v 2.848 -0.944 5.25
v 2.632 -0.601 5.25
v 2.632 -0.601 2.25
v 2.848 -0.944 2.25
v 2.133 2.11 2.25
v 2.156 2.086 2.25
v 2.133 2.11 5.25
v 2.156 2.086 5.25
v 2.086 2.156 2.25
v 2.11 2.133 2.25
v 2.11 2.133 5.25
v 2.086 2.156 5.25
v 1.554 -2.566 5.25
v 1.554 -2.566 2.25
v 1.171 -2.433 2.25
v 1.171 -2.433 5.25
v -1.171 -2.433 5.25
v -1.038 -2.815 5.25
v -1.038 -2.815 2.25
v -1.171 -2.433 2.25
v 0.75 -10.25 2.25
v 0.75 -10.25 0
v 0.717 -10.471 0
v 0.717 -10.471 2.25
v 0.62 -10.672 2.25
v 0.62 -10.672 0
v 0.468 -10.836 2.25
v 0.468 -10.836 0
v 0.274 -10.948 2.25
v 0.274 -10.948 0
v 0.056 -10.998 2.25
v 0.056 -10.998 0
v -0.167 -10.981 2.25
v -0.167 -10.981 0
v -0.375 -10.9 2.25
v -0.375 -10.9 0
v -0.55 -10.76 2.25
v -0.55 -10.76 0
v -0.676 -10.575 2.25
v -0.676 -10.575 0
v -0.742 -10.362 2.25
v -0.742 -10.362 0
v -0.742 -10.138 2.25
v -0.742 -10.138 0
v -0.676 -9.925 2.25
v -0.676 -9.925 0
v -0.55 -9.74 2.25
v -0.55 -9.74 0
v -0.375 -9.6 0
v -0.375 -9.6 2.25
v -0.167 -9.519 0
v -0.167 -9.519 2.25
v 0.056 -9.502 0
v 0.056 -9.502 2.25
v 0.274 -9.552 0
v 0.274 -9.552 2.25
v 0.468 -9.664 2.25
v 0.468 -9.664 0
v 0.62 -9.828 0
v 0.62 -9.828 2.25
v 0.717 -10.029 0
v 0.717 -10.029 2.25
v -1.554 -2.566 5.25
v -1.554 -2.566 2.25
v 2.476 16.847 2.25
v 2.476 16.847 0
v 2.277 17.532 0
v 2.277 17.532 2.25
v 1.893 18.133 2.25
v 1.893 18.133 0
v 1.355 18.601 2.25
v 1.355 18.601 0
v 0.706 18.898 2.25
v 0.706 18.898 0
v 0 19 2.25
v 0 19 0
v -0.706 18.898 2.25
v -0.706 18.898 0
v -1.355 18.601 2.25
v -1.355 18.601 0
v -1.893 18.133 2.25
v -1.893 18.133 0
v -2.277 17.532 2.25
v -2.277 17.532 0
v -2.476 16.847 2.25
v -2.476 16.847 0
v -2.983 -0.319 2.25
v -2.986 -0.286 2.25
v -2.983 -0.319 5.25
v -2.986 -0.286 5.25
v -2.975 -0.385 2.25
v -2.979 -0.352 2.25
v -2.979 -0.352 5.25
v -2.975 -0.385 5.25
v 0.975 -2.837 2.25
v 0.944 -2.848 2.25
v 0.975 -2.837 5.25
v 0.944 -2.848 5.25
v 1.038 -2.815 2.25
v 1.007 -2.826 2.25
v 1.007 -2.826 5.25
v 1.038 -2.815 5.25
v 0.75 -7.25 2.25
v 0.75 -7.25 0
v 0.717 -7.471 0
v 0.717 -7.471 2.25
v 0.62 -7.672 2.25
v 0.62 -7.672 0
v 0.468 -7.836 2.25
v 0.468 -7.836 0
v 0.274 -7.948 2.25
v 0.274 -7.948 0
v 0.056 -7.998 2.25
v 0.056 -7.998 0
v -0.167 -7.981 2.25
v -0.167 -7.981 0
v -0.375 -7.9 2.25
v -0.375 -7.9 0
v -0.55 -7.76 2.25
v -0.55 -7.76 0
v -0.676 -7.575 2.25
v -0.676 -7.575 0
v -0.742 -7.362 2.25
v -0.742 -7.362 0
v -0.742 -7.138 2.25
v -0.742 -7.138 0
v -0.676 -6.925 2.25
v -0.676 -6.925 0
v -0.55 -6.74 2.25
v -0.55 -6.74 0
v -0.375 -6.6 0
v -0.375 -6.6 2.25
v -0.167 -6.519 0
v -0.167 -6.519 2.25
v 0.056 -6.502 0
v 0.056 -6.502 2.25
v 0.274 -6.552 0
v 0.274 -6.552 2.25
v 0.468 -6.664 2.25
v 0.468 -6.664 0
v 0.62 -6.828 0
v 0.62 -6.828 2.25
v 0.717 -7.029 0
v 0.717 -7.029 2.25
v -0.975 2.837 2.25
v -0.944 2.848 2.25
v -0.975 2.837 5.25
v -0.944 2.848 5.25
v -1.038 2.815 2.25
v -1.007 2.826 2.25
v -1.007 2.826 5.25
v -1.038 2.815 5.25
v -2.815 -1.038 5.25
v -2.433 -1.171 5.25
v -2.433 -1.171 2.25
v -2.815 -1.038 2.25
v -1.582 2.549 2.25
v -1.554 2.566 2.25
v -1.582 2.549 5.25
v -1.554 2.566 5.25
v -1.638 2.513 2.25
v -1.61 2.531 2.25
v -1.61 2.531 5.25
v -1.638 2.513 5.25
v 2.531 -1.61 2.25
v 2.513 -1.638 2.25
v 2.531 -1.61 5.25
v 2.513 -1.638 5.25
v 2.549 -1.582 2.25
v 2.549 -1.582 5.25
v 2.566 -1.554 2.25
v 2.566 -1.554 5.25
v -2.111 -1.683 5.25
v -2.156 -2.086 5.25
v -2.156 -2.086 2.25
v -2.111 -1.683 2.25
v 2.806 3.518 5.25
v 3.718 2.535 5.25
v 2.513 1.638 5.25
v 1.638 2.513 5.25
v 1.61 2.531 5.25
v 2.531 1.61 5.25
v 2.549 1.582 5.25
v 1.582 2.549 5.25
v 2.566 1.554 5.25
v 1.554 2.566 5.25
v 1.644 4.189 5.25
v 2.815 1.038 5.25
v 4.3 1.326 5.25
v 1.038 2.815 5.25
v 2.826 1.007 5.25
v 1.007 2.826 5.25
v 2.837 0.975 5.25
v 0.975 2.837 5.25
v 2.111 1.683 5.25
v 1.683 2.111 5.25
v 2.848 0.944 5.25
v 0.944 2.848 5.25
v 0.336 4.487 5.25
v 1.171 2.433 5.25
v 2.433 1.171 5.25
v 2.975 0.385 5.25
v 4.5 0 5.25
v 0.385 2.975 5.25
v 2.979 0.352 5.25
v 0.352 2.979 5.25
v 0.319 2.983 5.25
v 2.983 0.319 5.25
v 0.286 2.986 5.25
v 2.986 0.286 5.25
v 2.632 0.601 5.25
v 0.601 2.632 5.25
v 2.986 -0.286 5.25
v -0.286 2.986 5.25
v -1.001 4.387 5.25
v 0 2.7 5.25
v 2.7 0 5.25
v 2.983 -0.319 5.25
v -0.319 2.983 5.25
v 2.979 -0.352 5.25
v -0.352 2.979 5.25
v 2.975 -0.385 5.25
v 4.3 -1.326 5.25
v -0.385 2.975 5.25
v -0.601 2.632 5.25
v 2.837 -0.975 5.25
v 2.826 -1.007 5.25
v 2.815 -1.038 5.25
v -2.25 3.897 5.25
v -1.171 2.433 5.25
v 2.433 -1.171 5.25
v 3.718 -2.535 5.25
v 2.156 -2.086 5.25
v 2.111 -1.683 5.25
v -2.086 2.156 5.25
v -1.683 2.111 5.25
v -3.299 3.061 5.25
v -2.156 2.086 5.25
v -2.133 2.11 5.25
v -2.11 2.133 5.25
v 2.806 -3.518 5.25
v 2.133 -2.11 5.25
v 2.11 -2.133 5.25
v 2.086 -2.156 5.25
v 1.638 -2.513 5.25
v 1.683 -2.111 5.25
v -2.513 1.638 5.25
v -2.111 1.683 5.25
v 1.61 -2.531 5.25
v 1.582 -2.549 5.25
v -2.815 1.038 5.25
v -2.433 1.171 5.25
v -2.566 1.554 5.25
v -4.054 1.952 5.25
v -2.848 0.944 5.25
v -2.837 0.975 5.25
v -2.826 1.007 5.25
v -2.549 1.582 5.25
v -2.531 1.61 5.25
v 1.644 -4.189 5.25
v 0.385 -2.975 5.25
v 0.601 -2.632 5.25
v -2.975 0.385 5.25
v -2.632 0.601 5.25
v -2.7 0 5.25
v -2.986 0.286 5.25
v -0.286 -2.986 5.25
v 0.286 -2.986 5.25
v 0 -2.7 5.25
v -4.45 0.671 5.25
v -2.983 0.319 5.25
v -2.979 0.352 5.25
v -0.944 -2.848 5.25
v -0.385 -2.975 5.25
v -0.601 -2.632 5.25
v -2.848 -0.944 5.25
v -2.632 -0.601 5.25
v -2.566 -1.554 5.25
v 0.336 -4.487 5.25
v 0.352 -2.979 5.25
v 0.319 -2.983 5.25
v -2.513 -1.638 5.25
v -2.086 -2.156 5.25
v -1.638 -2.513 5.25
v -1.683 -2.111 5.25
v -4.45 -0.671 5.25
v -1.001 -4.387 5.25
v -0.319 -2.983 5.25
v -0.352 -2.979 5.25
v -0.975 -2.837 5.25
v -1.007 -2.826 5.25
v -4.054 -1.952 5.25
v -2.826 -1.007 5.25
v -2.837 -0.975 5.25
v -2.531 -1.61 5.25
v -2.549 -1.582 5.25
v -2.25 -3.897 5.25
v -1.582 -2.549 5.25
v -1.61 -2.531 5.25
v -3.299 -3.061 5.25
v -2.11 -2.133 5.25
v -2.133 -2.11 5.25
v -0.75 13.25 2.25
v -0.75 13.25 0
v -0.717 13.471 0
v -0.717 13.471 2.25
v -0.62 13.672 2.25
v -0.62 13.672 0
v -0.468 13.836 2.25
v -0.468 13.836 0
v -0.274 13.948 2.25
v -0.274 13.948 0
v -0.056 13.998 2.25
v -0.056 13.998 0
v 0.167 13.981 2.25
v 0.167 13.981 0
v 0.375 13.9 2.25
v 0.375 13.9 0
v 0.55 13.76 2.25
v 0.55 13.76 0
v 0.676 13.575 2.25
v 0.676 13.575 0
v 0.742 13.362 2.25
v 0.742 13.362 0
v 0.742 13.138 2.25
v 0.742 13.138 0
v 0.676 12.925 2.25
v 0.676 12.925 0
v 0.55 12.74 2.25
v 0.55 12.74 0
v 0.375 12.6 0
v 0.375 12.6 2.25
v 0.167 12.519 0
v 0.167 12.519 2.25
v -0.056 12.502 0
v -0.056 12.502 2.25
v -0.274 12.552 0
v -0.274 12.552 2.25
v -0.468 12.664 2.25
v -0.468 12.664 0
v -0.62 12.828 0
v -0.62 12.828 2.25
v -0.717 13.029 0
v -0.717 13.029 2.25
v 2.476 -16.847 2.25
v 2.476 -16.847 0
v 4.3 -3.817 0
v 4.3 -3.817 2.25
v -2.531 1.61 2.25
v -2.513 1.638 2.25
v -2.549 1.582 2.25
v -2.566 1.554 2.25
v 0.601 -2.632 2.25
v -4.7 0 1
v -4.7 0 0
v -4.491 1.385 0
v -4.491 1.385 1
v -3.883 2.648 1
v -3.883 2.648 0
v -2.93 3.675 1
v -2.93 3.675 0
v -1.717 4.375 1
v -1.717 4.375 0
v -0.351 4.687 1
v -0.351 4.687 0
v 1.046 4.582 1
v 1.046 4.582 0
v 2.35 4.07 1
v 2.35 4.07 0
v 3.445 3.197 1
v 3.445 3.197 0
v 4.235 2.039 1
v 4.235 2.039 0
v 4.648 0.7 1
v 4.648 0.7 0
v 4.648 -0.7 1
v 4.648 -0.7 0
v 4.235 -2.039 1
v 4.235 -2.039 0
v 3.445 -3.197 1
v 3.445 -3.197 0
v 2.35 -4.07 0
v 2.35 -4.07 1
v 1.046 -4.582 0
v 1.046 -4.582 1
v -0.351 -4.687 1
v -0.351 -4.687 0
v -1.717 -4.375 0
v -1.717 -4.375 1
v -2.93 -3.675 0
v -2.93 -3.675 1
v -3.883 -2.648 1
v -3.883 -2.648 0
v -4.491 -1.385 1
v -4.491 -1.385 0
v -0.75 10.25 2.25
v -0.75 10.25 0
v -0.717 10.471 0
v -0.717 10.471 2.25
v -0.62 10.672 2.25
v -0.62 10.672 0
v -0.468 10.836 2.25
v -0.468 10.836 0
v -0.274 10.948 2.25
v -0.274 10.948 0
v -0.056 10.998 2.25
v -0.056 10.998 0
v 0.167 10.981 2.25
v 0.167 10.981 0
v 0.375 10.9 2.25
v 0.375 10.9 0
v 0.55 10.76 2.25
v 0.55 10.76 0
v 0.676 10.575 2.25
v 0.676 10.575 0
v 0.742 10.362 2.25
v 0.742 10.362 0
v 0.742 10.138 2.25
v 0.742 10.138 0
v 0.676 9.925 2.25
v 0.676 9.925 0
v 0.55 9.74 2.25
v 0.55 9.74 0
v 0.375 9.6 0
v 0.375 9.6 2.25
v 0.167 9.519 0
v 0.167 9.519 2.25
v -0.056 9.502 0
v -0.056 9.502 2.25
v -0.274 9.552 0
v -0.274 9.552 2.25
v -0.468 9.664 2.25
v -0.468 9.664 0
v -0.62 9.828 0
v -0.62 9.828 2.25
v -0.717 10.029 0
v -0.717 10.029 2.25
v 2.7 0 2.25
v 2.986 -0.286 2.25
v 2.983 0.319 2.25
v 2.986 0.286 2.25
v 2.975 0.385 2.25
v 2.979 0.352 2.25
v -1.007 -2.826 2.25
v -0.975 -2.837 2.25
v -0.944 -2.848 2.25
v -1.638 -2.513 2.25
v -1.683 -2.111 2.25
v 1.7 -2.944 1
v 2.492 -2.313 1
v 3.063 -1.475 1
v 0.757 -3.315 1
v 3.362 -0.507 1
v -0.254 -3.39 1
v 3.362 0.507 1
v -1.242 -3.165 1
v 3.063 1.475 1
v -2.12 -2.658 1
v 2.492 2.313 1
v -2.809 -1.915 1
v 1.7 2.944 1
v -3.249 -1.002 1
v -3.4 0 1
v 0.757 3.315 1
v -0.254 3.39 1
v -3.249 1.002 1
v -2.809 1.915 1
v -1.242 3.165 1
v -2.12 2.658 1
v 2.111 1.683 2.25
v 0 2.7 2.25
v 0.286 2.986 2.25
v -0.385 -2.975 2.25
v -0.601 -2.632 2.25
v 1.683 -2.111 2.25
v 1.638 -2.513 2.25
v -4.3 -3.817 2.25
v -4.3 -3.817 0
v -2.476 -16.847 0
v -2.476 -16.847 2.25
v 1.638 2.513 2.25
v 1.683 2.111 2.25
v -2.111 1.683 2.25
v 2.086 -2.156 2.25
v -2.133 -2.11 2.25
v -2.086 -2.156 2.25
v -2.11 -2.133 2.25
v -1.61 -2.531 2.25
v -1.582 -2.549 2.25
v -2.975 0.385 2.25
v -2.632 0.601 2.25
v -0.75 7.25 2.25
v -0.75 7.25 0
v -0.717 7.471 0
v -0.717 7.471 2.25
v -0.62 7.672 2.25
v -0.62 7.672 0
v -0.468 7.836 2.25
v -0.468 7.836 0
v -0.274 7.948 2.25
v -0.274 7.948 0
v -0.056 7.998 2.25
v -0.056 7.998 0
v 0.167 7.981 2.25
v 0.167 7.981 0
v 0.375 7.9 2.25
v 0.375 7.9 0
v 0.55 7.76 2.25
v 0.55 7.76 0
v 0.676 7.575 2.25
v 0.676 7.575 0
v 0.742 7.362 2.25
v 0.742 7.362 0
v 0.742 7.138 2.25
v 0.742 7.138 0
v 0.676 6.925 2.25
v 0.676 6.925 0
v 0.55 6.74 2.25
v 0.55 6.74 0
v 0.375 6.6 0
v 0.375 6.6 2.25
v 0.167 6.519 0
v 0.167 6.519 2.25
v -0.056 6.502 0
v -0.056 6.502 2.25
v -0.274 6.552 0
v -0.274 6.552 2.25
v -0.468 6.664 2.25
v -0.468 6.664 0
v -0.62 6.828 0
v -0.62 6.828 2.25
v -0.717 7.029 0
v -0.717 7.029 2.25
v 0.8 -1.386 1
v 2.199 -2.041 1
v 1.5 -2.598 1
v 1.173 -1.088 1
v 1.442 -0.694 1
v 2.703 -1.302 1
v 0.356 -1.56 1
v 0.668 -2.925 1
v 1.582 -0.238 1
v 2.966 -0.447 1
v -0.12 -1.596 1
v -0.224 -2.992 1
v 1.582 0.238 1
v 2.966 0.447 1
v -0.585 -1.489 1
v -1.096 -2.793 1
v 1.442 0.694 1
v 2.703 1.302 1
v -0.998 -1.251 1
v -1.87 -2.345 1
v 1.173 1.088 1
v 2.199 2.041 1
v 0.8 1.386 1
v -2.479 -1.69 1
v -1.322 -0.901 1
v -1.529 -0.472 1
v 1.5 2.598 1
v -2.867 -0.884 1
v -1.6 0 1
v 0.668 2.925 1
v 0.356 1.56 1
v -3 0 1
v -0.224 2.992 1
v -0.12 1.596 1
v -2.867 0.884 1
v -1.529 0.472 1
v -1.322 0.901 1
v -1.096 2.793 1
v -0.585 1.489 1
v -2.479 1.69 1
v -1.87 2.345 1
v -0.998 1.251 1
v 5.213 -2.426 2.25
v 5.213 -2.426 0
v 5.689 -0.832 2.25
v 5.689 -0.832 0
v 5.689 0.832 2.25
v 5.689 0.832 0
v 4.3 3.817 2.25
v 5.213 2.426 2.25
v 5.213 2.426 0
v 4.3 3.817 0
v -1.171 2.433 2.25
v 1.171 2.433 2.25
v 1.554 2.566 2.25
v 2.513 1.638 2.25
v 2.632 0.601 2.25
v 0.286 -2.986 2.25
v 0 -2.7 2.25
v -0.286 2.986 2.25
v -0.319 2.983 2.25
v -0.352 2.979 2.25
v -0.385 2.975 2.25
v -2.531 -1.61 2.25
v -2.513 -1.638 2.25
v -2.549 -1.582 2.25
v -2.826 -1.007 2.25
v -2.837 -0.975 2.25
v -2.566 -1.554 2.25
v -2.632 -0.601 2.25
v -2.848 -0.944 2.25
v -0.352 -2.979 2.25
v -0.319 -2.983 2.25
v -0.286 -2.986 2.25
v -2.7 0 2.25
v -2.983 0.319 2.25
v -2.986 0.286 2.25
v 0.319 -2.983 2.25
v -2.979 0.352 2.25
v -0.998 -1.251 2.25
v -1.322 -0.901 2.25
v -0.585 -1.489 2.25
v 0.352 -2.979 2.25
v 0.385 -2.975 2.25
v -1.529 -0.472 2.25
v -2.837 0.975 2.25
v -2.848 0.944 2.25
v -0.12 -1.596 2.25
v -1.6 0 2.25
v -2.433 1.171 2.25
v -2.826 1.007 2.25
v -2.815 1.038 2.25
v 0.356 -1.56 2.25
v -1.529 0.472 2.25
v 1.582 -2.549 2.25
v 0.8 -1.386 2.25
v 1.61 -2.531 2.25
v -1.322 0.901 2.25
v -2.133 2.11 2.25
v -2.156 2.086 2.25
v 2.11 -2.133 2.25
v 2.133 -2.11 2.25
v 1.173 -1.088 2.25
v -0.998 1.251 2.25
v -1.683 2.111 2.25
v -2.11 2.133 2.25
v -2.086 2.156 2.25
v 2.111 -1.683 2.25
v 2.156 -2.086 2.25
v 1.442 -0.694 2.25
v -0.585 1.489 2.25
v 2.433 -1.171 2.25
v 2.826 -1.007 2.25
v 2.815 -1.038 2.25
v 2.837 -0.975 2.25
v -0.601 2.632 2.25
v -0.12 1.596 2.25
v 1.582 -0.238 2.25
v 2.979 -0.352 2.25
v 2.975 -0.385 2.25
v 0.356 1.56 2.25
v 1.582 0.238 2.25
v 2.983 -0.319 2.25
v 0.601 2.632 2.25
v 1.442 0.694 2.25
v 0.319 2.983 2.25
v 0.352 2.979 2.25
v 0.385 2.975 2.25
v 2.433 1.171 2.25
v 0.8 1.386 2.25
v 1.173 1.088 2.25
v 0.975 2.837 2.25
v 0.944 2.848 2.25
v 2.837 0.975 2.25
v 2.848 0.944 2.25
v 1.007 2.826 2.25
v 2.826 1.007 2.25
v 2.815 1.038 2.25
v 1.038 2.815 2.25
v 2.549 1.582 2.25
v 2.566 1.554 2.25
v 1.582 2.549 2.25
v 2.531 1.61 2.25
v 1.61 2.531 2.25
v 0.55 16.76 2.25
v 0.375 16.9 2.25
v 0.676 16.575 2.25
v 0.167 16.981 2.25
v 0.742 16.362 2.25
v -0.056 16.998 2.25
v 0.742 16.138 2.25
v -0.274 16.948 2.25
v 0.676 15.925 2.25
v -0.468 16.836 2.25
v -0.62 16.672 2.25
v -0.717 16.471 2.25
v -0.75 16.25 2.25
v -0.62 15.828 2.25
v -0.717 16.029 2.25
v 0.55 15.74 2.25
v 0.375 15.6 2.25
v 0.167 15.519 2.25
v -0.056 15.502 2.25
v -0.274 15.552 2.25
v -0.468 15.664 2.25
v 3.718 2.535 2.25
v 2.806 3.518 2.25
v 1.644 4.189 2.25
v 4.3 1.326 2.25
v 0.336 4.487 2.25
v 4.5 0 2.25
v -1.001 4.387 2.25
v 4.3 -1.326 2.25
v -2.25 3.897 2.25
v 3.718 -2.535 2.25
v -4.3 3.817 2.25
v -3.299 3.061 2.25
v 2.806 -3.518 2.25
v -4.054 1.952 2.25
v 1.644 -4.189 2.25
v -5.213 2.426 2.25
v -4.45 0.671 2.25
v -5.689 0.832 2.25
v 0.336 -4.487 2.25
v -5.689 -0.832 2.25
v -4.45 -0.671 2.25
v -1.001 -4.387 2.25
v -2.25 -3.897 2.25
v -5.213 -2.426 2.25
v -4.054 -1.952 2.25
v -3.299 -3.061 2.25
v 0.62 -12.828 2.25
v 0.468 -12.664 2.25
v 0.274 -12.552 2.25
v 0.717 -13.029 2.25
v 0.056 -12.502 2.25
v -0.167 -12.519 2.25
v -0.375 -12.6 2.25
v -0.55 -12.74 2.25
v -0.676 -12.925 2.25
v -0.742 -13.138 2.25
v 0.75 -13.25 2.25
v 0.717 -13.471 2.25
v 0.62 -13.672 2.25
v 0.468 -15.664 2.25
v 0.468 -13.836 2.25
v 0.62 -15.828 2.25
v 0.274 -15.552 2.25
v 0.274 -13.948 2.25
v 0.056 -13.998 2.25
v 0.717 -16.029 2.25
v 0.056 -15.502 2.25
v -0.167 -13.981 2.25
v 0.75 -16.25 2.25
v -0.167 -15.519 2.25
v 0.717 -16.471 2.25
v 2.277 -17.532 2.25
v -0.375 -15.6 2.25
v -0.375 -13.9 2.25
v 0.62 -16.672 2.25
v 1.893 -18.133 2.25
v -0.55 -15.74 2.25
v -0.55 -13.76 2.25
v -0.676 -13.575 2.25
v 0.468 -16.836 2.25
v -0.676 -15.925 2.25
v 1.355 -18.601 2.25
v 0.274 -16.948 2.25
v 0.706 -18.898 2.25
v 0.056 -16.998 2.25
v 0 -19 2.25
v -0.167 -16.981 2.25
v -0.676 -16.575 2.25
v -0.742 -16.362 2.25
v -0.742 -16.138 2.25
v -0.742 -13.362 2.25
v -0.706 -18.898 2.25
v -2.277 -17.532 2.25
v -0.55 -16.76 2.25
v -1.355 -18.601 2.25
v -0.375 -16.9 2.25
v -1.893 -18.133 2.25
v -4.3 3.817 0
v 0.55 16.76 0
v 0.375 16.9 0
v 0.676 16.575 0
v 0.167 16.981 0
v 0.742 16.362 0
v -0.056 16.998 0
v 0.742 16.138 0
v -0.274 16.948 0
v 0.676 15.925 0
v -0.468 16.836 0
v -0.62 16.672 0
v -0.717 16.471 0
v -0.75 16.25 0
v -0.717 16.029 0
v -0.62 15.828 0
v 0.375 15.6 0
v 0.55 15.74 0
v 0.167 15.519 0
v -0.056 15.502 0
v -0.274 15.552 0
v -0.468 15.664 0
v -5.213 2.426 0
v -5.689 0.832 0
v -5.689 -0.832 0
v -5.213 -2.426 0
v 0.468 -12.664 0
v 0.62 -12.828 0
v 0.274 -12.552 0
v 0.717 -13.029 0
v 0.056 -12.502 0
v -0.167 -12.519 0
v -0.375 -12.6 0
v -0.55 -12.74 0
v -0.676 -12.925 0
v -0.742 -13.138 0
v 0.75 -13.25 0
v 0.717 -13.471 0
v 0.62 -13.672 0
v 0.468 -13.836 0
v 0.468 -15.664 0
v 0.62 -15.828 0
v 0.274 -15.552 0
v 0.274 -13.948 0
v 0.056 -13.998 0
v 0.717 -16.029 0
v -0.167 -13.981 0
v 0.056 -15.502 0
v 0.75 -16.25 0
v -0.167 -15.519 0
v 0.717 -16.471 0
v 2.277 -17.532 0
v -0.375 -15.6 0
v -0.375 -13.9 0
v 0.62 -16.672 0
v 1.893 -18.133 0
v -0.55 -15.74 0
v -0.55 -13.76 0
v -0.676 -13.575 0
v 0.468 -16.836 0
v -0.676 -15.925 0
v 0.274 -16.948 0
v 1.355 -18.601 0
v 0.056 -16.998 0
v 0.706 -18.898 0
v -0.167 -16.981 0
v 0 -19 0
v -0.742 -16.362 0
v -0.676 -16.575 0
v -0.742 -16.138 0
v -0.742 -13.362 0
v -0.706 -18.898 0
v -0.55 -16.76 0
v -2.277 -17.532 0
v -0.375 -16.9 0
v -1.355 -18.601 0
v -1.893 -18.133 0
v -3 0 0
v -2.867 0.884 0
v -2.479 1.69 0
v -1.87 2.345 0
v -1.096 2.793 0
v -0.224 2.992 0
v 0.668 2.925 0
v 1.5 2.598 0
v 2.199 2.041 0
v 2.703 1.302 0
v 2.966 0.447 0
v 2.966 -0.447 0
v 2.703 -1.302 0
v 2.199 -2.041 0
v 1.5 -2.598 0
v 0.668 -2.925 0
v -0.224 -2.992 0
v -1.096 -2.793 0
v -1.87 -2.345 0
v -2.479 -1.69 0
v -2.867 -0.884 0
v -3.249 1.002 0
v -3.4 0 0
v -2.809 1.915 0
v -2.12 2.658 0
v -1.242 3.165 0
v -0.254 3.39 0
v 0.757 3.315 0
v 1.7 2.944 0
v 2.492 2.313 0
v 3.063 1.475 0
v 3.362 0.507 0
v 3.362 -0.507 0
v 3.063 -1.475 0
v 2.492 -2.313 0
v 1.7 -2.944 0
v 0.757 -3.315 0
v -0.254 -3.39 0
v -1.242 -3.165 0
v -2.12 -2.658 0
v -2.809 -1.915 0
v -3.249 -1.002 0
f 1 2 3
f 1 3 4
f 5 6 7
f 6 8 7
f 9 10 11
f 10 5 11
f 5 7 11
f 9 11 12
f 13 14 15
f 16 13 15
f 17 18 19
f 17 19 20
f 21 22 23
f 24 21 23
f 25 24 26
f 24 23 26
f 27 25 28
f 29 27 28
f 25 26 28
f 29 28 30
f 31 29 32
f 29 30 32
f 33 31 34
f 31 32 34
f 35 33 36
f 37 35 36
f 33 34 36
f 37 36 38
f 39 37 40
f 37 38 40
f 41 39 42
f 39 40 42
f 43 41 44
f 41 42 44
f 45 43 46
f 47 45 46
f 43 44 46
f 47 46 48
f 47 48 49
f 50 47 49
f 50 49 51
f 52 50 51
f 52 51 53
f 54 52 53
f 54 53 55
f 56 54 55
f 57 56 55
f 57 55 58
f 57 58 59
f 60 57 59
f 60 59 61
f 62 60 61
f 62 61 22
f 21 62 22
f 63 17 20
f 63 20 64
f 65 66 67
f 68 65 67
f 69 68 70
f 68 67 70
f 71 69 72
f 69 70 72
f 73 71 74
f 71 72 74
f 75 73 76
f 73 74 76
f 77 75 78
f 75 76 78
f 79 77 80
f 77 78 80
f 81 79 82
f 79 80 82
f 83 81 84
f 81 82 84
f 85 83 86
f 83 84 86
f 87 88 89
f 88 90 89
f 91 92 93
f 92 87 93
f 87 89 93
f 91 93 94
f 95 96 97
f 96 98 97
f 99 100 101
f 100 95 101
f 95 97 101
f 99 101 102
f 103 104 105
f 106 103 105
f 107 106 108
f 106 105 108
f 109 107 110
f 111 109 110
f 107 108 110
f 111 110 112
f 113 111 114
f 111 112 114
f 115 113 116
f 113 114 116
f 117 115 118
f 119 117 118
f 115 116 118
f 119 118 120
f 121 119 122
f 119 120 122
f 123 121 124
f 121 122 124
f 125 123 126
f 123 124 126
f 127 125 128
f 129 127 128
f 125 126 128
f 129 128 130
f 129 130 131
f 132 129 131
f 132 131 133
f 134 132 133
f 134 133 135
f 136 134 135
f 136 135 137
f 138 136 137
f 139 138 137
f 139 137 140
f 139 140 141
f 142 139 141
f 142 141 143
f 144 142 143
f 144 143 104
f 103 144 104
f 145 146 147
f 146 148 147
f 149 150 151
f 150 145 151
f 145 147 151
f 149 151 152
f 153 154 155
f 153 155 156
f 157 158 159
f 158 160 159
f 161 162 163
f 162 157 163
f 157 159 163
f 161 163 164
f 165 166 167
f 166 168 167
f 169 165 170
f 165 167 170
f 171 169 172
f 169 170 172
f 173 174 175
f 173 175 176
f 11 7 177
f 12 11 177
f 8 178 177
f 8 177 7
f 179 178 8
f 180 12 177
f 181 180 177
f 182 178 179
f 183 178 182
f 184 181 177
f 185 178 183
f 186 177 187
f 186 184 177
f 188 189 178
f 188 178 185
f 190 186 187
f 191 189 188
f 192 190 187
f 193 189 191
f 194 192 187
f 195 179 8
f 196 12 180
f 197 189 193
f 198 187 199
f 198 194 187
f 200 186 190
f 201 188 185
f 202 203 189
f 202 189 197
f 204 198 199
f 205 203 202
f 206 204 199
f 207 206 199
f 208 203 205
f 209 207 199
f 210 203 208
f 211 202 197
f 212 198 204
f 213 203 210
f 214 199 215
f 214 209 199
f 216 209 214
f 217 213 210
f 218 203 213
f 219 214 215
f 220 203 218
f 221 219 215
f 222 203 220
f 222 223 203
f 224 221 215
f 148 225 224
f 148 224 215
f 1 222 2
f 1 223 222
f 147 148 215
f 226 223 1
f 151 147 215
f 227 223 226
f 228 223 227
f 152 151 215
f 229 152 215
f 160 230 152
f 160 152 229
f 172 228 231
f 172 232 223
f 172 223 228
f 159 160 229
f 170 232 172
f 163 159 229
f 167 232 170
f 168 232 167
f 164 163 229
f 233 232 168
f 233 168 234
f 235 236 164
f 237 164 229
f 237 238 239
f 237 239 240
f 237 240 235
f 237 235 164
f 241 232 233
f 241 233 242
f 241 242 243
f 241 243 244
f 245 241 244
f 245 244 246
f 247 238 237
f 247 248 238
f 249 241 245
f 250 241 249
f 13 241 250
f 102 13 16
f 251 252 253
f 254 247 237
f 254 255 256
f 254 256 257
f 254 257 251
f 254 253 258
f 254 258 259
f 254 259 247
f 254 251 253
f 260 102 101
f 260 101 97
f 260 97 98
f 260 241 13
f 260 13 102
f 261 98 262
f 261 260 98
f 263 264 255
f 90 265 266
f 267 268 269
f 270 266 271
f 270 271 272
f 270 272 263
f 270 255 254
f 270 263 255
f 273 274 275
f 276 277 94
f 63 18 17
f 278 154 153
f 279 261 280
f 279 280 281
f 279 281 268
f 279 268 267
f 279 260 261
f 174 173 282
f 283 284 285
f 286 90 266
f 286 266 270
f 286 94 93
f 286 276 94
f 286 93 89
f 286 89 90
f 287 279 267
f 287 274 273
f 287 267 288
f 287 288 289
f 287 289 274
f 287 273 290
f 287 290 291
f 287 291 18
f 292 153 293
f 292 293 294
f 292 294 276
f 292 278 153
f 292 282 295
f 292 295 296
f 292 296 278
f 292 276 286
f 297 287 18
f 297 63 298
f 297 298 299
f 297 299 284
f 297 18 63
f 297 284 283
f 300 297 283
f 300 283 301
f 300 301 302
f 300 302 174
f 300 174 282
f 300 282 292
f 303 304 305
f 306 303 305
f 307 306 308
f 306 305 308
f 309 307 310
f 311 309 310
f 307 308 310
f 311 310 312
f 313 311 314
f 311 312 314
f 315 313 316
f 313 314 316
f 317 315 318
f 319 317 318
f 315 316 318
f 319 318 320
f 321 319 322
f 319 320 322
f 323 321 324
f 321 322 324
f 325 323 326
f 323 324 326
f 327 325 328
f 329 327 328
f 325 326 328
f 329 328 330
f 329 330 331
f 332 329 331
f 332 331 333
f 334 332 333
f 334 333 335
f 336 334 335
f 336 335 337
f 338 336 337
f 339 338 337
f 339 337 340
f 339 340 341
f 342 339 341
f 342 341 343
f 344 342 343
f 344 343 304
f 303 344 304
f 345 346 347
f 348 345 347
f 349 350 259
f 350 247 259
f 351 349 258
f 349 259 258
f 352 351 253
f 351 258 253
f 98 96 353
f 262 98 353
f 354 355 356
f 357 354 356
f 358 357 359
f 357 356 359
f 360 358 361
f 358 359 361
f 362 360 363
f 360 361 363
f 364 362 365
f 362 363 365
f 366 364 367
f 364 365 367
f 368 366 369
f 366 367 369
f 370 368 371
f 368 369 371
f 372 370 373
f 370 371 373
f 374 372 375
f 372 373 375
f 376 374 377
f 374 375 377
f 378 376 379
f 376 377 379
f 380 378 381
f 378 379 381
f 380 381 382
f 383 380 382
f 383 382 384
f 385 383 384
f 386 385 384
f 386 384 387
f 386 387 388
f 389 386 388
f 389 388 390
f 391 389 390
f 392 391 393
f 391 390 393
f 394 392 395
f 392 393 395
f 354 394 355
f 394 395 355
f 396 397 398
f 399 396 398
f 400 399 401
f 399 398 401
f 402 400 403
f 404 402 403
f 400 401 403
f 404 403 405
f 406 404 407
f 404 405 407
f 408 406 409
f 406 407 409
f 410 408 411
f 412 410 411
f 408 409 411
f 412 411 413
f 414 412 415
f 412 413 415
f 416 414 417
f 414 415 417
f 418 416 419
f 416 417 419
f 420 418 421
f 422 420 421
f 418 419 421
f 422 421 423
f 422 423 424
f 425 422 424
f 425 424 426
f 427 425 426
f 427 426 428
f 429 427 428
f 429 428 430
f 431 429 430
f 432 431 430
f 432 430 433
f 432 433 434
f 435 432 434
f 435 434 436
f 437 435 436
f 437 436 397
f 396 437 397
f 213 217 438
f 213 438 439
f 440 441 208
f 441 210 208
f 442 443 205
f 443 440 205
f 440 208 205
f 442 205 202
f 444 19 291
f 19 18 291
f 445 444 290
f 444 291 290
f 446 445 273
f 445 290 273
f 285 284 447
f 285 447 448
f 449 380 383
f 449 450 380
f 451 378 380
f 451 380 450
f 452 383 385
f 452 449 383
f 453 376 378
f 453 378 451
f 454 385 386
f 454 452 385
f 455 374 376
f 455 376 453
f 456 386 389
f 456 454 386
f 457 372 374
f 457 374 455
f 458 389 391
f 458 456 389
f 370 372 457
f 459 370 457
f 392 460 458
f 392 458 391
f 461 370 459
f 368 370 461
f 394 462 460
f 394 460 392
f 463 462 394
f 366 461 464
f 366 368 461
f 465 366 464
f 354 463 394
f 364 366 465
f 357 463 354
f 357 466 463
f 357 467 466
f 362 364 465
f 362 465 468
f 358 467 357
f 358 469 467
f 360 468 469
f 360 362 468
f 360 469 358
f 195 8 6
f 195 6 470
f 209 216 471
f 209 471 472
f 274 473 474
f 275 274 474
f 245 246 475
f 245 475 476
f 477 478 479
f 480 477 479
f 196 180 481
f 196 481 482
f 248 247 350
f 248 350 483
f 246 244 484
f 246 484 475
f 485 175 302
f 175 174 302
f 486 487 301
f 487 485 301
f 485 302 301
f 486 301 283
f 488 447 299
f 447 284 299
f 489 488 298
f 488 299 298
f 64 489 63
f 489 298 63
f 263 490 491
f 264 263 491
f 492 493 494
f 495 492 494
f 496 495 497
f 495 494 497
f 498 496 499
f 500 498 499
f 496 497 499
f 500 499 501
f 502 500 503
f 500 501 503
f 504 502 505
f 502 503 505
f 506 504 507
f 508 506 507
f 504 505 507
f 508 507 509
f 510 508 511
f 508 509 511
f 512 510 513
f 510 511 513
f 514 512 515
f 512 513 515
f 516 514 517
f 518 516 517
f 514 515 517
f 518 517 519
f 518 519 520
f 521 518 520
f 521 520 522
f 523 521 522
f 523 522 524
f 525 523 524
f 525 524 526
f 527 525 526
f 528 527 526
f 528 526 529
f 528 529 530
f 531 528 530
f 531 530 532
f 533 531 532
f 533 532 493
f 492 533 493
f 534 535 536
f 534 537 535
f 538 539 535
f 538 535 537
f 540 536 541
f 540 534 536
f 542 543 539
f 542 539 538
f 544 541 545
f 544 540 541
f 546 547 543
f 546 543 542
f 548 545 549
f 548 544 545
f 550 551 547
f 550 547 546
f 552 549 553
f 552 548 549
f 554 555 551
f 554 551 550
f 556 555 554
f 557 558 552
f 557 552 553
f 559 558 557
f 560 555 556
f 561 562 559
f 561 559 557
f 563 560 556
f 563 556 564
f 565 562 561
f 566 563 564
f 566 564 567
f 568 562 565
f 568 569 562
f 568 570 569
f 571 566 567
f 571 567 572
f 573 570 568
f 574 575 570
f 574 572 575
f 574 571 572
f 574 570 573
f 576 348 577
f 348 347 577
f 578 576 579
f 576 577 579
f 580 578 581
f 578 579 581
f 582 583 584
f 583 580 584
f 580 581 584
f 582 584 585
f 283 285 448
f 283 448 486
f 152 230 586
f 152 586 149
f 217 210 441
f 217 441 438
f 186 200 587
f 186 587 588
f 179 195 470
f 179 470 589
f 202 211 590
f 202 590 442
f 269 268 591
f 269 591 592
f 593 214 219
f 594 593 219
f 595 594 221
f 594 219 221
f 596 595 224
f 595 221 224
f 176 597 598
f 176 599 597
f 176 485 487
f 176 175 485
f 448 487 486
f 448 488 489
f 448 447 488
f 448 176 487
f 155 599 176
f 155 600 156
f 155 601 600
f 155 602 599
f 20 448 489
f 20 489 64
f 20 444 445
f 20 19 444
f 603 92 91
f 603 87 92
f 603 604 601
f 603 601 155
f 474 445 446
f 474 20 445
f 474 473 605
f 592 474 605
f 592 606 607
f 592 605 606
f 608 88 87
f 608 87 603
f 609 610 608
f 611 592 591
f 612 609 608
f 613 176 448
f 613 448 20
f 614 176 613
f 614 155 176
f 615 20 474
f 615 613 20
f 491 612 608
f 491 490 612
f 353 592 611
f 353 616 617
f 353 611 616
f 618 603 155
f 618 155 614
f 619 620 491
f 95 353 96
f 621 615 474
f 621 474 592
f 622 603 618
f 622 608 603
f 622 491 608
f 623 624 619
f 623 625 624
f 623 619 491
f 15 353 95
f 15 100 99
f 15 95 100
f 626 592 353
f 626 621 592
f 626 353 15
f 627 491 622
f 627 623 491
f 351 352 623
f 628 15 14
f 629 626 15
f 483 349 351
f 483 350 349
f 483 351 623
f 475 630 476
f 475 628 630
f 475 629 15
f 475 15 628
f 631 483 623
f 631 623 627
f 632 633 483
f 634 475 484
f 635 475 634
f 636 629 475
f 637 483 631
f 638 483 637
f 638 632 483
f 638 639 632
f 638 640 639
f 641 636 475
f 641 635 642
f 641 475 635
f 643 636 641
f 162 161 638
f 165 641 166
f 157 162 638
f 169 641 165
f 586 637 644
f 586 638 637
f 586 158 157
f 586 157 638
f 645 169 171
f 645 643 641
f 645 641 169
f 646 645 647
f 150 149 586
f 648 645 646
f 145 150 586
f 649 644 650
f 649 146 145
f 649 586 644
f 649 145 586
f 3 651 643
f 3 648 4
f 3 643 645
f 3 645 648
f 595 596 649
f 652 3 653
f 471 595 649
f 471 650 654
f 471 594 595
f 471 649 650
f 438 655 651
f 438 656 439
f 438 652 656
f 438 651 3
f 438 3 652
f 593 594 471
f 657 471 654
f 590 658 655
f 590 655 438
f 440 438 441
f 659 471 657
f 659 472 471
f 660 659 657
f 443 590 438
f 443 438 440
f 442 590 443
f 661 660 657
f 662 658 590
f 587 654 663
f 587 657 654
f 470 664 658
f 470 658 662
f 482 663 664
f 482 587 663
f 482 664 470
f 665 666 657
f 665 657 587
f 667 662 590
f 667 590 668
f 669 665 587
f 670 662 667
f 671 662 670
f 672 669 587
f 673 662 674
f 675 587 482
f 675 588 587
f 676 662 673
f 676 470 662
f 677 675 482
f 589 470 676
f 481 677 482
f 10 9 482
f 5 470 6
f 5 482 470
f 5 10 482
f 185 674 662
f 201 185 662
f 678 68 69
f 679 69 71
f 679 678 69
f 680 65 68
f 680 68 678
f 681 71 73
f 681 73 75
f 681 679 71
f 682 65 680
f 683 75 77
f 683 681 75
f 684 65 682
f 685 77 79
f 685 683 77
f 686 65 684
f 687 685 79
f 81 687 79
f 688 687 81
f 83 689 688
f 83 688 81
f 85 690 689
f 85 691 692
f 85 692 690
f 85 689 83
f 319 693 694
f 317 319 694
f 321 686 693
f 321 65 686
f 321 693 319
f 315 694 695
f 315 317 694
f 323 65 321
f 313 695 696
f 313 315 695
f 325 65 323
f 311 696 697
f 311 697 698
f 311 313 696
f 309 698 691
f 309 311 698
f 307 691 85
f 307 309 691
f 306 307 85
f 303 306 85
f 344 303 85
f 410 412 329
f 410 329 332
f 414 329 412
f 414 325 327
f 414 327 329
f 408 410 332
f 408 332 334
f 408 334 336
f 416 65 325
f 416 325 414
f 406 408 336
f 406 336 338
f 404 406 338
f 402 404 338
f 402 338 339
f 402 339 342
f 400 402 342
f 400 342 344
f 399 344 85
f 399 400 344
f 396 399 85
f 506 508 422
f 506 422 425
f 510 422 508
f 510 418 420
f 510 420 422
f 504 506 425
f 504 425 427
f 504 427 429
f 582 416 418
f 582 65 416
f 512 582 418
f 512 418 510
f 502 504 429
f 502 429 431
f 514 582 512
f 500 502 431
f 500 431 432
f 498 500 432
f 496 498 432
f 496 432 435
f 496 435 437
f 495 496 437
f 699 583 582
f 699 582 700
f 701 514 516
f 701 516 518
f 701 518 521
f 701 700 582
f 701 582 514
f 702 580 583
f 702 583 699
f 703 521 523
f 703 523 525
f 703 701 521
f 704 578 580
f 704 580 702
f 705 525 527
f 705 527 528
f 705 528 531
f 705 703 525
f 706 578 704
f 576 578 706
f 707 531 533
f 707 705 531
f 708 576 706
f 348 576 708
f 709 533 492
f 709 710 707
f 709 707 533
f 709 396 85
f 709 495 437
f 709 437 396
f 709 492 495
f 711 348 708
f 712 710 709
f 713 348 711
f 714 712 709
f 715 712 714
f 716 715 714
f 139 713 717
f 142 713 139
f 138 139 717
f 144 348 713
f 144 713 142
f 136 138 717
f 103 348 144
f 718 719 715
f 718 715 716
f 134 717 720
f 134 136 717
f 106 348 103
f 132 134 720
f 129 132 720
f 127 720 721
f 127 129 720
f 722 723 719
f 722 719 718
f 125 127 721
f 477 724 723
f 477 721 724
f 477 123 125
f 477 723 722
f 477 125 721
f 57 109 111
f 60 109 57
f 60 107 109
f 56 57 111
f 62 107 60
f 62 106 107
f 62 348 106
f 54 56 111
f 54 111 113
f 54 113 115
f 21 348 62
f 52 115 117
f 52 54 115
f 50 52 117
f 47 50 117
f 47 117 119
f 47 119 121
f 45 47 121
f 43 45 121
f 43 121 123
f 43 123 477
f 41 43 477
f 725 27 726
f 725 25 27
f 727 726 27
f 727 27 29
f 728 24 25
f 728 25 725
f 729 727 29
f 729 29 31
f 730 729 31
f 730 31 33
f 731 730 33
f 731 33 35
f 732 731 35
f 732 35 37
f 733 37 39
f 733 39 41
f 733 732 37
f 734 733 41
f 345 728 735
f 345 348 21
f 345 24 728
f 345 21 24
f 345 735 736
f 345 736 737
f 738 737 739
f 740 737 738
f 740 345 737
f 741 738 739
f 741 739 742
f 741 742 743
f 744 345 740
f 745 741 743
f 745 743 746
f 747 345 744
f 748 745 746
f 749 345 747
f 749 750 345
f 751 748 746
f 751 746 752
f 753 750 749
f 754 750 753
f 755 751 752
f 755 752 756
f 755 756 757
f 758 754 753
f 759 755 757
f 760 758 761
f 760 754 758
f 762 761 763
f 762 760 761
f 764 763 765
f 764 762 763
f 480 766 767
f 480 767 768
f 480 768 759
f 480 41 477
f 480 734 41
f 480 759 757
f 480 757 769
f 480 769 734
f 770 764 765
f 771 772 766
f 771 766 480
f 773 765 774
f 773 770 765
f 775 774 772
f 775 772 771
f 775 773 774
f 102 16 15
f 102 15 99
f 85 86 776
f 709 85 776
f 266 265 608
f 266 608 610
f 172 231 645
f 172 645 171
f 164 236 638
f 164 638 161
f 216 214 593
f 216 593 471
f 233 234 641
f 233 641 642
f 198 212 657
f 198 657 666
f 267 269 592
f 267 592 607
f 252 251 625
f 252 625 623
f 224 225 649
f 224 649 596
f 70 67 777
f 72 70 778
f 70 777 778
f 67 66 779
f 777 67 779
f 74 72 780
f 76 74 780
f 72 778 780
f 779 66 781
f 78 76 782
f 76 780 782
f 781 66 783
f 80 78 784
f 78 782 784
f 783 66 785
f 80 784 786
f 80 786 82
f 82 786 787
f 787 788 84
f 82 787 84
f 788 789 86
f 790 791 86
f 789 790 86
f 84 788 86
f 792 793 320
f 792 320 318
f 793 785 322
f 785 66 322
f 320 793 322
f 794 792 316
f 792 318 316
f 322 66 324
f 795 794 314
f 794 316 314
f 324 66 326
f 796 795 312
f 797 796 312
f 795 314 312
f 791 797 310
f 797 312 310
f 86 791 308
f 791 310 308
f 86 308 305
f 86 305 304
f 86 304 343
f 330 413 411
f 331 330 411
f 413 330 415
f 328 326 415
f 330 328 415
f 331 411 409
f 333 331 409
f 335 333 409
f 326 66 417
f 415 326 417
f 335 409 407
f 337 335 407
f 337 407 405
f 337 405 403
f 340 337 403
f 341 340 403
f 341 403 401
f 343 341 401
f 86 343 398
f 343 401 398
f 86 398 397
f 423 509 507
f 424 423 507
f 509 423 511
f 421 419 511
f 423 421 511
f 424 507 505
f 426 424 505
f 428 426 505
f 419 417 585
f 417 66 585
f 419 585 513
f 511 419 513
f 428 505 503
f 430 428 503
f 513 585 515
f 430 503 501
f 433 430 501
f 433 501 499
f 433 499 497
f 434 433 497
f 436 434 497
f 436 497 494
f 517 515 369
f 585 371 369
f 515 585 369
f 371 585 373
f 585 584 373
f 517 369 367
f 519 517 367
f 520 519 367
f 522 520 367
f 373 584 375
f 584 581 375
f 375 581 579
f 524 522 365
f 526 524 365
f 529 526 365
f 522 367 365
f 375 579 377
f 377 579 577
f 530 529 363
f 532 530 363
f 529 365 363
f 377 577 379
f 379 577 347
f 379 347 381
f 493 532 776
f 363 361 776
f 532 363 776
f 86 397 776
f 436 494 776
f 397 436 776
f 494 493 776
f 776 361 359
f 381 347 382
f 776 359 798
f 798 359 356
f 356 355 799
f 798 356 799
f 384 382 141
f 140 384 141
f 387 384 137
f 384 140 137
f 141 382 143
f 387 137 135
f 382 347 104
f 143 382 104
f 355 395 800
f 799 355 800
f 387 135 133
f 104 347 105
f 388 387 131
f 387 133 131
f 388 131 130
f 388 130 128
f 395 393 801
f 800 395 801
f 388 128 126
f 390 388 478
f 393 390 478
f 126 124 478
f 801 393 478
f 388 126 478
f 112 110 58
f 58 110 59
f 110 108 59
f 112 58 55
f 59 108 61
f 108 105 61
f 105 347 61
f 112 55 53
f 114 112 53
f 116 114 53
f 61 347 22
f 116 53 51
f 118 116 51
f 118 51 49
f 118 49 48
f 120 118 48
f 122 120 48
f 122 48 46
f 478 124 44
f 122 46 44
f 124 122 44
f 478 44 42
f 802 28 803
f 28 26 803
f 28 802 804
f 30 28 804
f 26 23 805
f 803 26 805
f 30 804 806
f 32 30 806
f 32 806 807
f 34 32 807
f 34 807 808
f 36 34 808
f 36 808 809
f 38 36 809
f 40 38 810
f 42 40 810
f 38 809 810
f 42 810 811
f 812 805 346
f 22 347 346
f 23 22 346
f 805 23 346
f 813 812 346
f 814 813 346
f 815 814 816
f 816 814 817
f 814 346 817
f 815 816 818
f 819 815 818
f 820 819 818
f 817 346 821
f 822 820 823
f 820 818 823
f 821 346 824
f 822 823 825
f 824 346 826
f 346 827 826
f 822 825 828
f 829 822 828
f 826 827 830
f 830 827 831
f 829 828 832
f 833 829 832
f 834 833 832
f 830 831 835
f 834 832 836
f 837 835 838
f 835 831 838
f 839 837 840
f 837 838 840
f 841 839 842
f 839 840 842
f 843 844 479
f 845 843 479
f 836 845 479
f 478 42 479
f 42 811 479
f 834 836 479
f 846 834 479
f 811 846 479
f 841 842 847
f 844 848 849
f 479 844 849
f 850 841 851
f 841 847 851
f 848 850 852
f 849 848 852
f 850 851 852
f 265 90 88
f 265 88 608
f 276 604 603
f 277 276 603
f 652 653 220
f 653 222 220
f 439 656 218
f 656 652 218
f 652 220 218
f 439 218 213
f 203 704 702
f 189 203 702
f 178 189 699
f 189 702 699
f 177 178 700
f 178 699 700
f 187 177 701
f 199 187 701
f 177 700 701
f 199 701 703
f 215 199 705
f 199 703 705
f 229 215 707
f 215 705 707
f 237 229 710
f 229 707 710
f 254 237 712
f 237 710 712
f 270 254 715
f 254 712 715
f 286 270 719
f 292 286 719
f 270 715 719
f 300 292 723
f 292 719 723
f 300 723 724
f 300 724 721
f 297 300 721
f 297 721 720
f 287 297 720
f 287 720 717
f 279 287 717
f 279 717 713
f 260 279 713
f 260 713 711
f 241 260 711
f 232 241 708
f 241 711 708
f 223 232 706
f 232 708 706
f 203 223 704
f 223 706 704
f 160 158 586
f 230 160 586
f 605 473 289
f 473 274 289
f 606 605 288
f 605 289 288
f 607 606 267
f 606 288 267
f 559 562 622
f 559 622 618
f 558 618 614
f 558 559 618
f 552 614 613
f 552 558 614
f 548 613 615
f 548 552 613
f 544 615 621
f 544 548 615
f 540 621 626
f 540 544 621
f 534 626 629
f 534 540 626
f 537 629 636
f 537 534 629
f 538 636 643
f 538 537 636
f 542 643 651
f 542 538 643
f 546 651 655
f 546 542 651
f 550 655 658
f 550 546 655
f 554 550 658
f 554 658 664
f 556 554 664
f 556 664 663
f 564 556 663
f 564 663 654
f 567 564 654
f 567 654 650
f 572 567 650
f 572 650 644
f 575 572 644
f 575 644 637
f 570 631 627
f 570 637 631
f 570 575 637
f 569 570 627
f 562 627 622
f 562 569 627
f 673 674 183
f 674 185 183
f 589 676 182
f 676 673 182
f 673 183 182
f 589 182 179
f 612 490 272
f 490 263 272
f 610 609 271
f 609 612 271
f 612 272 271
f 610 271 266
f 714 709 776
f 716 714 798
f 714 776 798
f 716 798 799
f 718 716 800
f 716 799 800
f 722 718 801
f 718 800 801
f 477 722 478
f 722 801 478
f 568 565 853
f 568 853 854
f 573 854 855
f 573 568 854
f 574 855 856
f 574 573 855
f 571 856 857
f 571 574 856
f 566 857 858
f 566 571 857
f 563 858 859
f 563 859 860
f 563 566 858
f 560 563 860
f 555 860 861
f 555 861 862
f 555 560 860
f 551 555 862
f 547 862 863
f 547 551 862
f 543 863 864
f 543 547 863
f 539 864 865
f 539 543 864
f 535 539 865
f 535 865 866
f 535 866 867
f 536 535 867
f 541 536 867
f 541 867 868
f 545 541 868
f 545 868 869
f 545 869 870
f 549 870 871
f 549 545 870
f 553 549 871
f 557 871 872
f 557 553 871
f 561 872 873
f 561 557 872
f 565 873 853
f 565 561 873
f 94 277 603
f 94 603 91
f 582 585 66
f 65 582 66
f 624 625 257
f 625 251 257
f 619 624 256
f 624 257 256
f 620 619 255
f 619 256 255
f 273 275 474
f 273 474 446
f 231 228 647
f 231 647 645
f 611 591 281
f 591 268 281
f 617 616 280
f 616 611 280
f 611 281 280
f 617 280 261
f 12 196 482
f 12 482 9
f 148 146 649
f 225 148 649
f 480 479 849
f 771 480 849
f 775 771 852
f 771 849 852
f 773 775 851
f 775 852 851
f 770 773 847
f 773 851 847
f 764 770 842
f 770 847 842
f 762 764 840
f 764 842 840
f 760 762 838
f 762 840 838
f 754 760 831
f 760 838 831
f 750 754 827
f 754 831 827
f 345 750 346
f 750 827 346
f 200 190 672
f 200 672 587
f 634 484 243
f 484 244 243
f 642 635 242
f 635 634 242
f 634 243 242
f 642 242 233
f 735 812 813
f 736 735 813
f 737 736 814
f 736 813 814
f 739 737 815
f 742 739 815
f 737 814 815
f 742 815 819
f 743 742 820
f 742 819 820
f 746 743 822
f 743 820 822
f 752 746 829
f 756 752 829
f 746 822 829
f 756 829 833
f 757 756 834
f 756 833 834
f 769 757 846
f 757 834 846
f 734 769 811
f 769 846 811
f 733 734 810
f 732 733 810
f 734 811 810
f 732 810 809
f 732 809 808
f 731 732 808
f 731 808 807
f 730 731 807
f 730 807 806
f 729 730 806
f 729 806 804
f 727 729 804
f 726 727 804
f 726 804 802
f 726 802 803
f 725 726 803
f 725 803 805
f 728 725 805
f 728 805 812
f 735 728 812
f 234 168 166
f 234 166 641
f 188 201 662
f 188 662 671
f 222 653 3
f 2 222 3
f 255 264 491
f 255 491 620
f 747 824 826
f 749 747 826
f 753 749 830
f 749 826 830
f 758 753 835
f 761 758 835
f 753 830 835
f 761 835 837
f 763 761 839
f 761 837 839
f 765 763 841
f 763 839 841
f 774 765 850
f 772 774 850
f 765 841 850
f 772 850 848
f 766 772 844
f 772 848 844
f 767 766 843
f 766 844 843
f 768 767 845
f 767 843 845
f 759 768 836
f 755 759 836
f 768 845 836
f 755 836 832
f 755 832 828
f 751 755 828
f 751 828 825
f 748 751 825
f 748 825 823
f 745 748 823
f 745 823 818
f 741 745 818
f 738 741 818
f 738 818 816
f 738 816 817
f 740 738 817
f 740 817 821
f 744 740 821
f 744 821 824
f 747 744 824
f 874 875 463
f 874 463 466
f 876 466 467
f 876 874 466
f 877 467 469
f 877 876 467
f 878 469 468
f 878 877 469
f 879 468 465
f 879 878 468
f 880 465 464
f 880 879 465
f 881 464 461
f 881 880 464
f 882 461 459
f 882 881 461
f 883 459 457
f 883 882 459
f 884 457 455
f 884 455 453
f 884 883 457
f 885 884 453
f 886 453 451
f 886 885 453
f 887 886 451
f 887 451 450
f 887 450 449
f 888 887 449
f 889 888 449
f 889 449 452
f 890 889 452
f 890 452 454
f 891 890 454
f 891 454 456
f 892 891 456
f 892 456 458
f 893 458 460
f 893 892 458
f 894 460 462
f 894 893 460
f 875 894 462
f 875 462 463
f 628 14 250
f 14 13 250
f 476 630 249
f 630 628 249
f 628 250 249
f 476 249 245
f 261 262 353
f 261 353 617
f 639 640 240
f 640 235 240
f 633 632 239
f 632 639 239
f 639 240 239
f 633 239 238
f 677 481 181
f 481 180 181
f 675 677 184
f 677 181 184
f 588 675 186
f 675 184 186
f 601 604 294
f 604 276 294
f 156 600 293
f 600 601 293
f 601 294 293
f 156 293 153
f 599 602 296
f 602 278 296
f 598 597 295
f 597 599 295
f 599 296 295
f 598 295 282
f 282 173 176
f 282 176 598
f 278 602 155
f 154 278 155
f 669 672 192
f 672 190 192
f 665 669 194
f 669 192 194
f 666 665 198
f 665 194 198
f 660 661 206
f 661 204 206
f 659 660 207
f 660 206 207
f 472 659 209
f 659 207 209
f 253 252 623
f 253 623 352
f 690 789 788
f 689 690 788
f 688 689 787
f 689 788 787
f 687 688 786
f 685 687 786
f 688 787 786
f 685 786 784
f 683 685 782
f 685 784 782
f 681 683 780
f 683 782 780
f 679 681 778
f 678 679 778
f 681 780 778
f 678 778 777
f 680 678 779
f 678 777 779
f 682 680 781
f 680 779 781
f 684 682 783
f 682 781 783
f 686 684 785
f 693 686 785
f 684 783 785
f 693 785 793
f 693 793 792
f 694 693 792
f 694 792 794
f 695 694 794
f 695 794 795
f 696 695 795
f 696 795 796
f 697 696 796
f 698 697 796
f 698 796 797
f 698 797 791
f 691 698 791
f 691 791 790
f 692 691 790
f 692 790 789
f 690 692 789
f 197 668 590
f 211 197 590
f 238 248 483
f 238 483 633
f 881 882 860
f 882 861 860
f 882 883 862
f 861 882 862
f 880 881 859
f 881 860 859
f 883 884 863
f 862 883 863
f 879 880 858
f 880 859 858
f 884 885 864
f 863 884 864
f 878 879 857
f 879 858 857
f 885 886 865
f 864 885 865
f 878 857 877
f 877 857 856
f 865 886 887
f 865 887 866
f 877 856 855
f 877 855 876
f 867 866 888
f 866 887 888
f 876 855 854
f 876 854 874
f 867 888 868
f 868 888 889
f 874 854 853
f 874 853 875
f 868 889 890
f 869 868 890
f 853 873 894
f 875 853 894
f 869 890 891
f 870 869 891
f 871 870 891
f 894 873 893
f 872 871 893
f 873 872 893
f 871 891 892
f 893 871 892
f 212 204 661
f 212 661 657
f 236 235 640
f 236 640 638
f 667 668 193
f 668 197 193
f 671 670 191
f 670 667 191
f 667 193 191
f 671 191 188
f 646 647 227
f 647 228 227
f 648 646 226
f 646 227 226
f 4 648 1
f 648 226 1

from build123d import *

# Parameters (mm, degrees)
ESQUISSE1_R                  = 5.75
ESQUISSE1_R_2                = 1.6
BOSS_EXTRU_1_DEPTH           = 5.25
ESQUISSE2_R                  = 3
ENL_V_MAT_EXTRU_1_DEPTH      = 3
ENL_V_START                  = -3
ESQUISSE3_R                  = 5.75
ESQUISSE3_R_2                = 4.5
ENL_V_MAT_EXTRU_2_DEPTH      = 3
BOSS_EXTRU_2_DEPTH           = 2.25
R_P_TITION_CIRCULAIRE1_COUNT = 2
ESQUISSE5_R                  = 0.75
ENL_V_MAT_EXTRU_3_DEPTH      = 3
R_P_TITION_CIRCULAIRE2_COUNT = 2
BOSS_EXTRU_3_DEPTH           = 3
R_P_TITION_CIRCULAIRE3_COUNT = 28
ENL_V_START_2                = -1
ESQUISSE7_R                  = 3
ESQUISSE7_R_2                = 1.6
ENL_V_MAT_EXTRU_4_DEPTH      = 1
ESQUISSE8_R                  = 4.7
ESQUISSE8_R_2                = 3.4
ENL_V_MAT_EXTRU_5_DEPTH      = 1


with BuildPart() as part:
    # Esquisse1 → Boss.-Extru.1 (new body)
    with BuildSketch(Plane.XY):
        with Locations(Location((0, 0, 0), (0, 0, 180))):
            Circle(ESQUISSE1_R)
        with Locations(Location((0, 0, 0), (0, 0, 180))):
            Circle(ESQUISSE1_R_2, mode=Mode.SUBTRACT)
    extrude(amount=BOSS_EXTRU_1_DEPTH)

    # Esquisse2 → Enlèv. mat.-Extru.1 (cut)
    with BuildSketch(Plane.XY.offset(5.25)):
        Circle(ESQUISSE2_R)
    extrude(amount=-ENL_V_MAT_EXTRU_1_DEPTH, mode=Mode.SUBTRACT)

    # Esquisse3 → Enlèv. mat.-Extru.2 (cut)
    with BuildSketch(Plane.XY.offset(5.25).offset(ENL_V_START)):
        with Locations(Location((0, 0, 0), (0, 0, 180))):
            Circle(ESQUISSE3_R)
        Circle(ESQUISSE3_R_2, mode=Mode.SUBTRACT)
    extrude(amount=ENL_V_MAT_EXTRU_2_DEPTH, mode=Mode.SUBTRACT)

    # Esquisse4 → Boss.-Extru.2 (add)
    with BuildSketch(Plane(origin=(0, 0, 0), x_dir=(-1, 0, 0), z_dir=(0, 0, -1))):
        with BuildLine():
            Line((-4.3, 3.817394399), (-2.475852955, 16.846629695))
            ThreePointArc((-2.475852955, 16.846629695), (0, 19), (2.475852955, 16.846629695))
            Line((2.475852955, 16.846629695), (4.3, 3.817394399))
            ThreePointArc((4.3, 3.817394399), (0, 5.75), (-4.3, 3.817394399))
        make_face()
    boss_extru_2 = extrude(amount=-BOSS_EXTRU_2_DEPTH)

    # Répétition circulaire1: Boss.-Extru.2 ×2 about axis
    r_p_tition_circulaire1_axis = Axis((0, 0, 0), (0, 0, 1))
    for i in range(1, R_P_TITION_CIRCULAIRE1_COUNT):
        add(boss_extru_2.rotate(r_p_tition_circulaire1_axis, i * 360 / R_P_TITION_CIRCULAIRE1_COUNT))

    # Esquisse5 → Enlèv. mat.-Extru.3 (cut)
    with BuildSketch(Plane(origin=(0, 0, 0), x_dir=(-1, 0, 0), z_dir=(0, 0, -1))):
        with Locations((0, 7.25)):
            Circle(ESQUISSE5_R)
        with Locations((0, 10.25)):
            Circle(ESQUISSE5_R)
        with Locations((0, 13.25)):
            Circle(ESQUISSE5_R)
        with Locations((0, 16.25)):
            Circle(ESQUISSE5_R)
    enl_v_mat_extru_3 = extrude(amount=-ENL_V_MAT_EXTRU_3_DEPTH, mode=Mode.SUBTRACT)

    # Répétition circulaire2: Enlèv. mat.-Extru.3 ×2 about axis
    r_p_tition_circulaire2_axis = Axis((0, 0, 0), (0, 0, 1))
    for i in range(1, R_P_TITION_CIRCULAIRE2_COUNT):
        add(enl_v_mat_extru_3.rotate(r_p_tition_circulaire2_axis, i * 360 / R_P_TITION_CIRCULAIRE2_COUNT), mode=Mode.SUBTRACT)

    # Esquisse6 → Boss.-Extru.3 (add)
    with BuildSketch(Plane.XY.offset(5.25)):
        Polygon((-0.3, 3), (0, 2.7), (0.3, 3), align=None)
    boss_extru_3 = extrude(amount=-BOSS_EXTRU_3_DEPTH)

    # Répétition circulaire3: Boss.-Extru.3 ×28 about axis
    r_p_tition_circulaire3_axis = Axis((0, 0, 0), (0, 0, 1))
    for i in range(1, R_P_TITION_CIRCULAIRE3_COUNT):
        add(boss_extru_3.rotate(r_p_tition_circulaire3_axis, i * 360 / R_P_TITION_CIRCULAIRE3_COUNT))

    # Esquisse7 → Enlèv. mat.-Extru.4 (cut)
    with BuildSketch(Plane(origin=(0, 0, 0), x_dir=(-1, 0, 0), z_dir=(0, 0, -1)).offset(ENL_V_START_2)):
        Circle(ESQUISSE7_R)
        Circle(ESQUISSE7_R_2, mode=Mode.SUBTRACT)
    extrude(amount=ENL_V_MAT_EXTRU_4_DEPTH, mode=Mode.SUBTRACT)

    # Esquisse8 → Enlèv. mat.-Extru.5 (cut)
    with BuildSketch(Plane(origin=(0, 0, 0), x_dir=(-1, 0, 0), z_dir=(0, 0, -1))):
        Circle(ESQUISSE8_R)
        Circle(ESQUISSE8_R_2, mode=Mode.SUBTRACT)
    extrude(amount=-ENL_V_MAT_EXTRU_5_DEPTH, mode=Mode.SUBTRACT)


solid = part.part
